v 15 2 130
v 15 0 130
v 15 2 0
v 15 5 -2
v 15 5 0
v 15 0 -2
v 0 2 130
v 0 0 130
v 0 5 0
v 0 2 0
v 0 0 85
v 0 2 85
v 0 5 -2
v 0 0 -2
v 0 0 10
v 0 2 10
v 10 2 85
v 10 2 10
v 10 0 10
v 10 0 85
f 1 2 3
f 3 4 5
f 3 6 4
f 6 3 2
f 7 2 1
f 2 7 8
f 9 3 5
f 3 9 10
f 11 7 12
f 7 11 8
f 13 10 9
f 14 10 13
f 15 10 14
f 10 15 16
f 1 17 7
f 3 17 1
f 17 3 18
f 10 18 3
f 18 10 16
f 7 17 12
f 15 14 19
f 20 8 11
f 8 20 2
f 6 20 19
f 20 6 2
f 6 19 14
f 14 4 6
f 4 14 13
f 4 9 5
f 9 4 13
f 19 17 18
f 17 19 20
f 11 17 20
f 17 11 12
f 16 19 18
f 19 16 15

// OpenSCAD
$fn=100;


//difference() {
//    union(){
//    cube([15,2,130]);
//    translate([0,0,-2]) cube([15,5,2]);
//    }
//    
//    translate([5,0,25]) cube([10,2,65]);
//}

difference() {
    union(){
    cube([15,2,130]);
    translate([0,0,-2]) cube([15,5,2]);
    }
    
    translate([0,0,10]) cube([10,2,75]);
}
